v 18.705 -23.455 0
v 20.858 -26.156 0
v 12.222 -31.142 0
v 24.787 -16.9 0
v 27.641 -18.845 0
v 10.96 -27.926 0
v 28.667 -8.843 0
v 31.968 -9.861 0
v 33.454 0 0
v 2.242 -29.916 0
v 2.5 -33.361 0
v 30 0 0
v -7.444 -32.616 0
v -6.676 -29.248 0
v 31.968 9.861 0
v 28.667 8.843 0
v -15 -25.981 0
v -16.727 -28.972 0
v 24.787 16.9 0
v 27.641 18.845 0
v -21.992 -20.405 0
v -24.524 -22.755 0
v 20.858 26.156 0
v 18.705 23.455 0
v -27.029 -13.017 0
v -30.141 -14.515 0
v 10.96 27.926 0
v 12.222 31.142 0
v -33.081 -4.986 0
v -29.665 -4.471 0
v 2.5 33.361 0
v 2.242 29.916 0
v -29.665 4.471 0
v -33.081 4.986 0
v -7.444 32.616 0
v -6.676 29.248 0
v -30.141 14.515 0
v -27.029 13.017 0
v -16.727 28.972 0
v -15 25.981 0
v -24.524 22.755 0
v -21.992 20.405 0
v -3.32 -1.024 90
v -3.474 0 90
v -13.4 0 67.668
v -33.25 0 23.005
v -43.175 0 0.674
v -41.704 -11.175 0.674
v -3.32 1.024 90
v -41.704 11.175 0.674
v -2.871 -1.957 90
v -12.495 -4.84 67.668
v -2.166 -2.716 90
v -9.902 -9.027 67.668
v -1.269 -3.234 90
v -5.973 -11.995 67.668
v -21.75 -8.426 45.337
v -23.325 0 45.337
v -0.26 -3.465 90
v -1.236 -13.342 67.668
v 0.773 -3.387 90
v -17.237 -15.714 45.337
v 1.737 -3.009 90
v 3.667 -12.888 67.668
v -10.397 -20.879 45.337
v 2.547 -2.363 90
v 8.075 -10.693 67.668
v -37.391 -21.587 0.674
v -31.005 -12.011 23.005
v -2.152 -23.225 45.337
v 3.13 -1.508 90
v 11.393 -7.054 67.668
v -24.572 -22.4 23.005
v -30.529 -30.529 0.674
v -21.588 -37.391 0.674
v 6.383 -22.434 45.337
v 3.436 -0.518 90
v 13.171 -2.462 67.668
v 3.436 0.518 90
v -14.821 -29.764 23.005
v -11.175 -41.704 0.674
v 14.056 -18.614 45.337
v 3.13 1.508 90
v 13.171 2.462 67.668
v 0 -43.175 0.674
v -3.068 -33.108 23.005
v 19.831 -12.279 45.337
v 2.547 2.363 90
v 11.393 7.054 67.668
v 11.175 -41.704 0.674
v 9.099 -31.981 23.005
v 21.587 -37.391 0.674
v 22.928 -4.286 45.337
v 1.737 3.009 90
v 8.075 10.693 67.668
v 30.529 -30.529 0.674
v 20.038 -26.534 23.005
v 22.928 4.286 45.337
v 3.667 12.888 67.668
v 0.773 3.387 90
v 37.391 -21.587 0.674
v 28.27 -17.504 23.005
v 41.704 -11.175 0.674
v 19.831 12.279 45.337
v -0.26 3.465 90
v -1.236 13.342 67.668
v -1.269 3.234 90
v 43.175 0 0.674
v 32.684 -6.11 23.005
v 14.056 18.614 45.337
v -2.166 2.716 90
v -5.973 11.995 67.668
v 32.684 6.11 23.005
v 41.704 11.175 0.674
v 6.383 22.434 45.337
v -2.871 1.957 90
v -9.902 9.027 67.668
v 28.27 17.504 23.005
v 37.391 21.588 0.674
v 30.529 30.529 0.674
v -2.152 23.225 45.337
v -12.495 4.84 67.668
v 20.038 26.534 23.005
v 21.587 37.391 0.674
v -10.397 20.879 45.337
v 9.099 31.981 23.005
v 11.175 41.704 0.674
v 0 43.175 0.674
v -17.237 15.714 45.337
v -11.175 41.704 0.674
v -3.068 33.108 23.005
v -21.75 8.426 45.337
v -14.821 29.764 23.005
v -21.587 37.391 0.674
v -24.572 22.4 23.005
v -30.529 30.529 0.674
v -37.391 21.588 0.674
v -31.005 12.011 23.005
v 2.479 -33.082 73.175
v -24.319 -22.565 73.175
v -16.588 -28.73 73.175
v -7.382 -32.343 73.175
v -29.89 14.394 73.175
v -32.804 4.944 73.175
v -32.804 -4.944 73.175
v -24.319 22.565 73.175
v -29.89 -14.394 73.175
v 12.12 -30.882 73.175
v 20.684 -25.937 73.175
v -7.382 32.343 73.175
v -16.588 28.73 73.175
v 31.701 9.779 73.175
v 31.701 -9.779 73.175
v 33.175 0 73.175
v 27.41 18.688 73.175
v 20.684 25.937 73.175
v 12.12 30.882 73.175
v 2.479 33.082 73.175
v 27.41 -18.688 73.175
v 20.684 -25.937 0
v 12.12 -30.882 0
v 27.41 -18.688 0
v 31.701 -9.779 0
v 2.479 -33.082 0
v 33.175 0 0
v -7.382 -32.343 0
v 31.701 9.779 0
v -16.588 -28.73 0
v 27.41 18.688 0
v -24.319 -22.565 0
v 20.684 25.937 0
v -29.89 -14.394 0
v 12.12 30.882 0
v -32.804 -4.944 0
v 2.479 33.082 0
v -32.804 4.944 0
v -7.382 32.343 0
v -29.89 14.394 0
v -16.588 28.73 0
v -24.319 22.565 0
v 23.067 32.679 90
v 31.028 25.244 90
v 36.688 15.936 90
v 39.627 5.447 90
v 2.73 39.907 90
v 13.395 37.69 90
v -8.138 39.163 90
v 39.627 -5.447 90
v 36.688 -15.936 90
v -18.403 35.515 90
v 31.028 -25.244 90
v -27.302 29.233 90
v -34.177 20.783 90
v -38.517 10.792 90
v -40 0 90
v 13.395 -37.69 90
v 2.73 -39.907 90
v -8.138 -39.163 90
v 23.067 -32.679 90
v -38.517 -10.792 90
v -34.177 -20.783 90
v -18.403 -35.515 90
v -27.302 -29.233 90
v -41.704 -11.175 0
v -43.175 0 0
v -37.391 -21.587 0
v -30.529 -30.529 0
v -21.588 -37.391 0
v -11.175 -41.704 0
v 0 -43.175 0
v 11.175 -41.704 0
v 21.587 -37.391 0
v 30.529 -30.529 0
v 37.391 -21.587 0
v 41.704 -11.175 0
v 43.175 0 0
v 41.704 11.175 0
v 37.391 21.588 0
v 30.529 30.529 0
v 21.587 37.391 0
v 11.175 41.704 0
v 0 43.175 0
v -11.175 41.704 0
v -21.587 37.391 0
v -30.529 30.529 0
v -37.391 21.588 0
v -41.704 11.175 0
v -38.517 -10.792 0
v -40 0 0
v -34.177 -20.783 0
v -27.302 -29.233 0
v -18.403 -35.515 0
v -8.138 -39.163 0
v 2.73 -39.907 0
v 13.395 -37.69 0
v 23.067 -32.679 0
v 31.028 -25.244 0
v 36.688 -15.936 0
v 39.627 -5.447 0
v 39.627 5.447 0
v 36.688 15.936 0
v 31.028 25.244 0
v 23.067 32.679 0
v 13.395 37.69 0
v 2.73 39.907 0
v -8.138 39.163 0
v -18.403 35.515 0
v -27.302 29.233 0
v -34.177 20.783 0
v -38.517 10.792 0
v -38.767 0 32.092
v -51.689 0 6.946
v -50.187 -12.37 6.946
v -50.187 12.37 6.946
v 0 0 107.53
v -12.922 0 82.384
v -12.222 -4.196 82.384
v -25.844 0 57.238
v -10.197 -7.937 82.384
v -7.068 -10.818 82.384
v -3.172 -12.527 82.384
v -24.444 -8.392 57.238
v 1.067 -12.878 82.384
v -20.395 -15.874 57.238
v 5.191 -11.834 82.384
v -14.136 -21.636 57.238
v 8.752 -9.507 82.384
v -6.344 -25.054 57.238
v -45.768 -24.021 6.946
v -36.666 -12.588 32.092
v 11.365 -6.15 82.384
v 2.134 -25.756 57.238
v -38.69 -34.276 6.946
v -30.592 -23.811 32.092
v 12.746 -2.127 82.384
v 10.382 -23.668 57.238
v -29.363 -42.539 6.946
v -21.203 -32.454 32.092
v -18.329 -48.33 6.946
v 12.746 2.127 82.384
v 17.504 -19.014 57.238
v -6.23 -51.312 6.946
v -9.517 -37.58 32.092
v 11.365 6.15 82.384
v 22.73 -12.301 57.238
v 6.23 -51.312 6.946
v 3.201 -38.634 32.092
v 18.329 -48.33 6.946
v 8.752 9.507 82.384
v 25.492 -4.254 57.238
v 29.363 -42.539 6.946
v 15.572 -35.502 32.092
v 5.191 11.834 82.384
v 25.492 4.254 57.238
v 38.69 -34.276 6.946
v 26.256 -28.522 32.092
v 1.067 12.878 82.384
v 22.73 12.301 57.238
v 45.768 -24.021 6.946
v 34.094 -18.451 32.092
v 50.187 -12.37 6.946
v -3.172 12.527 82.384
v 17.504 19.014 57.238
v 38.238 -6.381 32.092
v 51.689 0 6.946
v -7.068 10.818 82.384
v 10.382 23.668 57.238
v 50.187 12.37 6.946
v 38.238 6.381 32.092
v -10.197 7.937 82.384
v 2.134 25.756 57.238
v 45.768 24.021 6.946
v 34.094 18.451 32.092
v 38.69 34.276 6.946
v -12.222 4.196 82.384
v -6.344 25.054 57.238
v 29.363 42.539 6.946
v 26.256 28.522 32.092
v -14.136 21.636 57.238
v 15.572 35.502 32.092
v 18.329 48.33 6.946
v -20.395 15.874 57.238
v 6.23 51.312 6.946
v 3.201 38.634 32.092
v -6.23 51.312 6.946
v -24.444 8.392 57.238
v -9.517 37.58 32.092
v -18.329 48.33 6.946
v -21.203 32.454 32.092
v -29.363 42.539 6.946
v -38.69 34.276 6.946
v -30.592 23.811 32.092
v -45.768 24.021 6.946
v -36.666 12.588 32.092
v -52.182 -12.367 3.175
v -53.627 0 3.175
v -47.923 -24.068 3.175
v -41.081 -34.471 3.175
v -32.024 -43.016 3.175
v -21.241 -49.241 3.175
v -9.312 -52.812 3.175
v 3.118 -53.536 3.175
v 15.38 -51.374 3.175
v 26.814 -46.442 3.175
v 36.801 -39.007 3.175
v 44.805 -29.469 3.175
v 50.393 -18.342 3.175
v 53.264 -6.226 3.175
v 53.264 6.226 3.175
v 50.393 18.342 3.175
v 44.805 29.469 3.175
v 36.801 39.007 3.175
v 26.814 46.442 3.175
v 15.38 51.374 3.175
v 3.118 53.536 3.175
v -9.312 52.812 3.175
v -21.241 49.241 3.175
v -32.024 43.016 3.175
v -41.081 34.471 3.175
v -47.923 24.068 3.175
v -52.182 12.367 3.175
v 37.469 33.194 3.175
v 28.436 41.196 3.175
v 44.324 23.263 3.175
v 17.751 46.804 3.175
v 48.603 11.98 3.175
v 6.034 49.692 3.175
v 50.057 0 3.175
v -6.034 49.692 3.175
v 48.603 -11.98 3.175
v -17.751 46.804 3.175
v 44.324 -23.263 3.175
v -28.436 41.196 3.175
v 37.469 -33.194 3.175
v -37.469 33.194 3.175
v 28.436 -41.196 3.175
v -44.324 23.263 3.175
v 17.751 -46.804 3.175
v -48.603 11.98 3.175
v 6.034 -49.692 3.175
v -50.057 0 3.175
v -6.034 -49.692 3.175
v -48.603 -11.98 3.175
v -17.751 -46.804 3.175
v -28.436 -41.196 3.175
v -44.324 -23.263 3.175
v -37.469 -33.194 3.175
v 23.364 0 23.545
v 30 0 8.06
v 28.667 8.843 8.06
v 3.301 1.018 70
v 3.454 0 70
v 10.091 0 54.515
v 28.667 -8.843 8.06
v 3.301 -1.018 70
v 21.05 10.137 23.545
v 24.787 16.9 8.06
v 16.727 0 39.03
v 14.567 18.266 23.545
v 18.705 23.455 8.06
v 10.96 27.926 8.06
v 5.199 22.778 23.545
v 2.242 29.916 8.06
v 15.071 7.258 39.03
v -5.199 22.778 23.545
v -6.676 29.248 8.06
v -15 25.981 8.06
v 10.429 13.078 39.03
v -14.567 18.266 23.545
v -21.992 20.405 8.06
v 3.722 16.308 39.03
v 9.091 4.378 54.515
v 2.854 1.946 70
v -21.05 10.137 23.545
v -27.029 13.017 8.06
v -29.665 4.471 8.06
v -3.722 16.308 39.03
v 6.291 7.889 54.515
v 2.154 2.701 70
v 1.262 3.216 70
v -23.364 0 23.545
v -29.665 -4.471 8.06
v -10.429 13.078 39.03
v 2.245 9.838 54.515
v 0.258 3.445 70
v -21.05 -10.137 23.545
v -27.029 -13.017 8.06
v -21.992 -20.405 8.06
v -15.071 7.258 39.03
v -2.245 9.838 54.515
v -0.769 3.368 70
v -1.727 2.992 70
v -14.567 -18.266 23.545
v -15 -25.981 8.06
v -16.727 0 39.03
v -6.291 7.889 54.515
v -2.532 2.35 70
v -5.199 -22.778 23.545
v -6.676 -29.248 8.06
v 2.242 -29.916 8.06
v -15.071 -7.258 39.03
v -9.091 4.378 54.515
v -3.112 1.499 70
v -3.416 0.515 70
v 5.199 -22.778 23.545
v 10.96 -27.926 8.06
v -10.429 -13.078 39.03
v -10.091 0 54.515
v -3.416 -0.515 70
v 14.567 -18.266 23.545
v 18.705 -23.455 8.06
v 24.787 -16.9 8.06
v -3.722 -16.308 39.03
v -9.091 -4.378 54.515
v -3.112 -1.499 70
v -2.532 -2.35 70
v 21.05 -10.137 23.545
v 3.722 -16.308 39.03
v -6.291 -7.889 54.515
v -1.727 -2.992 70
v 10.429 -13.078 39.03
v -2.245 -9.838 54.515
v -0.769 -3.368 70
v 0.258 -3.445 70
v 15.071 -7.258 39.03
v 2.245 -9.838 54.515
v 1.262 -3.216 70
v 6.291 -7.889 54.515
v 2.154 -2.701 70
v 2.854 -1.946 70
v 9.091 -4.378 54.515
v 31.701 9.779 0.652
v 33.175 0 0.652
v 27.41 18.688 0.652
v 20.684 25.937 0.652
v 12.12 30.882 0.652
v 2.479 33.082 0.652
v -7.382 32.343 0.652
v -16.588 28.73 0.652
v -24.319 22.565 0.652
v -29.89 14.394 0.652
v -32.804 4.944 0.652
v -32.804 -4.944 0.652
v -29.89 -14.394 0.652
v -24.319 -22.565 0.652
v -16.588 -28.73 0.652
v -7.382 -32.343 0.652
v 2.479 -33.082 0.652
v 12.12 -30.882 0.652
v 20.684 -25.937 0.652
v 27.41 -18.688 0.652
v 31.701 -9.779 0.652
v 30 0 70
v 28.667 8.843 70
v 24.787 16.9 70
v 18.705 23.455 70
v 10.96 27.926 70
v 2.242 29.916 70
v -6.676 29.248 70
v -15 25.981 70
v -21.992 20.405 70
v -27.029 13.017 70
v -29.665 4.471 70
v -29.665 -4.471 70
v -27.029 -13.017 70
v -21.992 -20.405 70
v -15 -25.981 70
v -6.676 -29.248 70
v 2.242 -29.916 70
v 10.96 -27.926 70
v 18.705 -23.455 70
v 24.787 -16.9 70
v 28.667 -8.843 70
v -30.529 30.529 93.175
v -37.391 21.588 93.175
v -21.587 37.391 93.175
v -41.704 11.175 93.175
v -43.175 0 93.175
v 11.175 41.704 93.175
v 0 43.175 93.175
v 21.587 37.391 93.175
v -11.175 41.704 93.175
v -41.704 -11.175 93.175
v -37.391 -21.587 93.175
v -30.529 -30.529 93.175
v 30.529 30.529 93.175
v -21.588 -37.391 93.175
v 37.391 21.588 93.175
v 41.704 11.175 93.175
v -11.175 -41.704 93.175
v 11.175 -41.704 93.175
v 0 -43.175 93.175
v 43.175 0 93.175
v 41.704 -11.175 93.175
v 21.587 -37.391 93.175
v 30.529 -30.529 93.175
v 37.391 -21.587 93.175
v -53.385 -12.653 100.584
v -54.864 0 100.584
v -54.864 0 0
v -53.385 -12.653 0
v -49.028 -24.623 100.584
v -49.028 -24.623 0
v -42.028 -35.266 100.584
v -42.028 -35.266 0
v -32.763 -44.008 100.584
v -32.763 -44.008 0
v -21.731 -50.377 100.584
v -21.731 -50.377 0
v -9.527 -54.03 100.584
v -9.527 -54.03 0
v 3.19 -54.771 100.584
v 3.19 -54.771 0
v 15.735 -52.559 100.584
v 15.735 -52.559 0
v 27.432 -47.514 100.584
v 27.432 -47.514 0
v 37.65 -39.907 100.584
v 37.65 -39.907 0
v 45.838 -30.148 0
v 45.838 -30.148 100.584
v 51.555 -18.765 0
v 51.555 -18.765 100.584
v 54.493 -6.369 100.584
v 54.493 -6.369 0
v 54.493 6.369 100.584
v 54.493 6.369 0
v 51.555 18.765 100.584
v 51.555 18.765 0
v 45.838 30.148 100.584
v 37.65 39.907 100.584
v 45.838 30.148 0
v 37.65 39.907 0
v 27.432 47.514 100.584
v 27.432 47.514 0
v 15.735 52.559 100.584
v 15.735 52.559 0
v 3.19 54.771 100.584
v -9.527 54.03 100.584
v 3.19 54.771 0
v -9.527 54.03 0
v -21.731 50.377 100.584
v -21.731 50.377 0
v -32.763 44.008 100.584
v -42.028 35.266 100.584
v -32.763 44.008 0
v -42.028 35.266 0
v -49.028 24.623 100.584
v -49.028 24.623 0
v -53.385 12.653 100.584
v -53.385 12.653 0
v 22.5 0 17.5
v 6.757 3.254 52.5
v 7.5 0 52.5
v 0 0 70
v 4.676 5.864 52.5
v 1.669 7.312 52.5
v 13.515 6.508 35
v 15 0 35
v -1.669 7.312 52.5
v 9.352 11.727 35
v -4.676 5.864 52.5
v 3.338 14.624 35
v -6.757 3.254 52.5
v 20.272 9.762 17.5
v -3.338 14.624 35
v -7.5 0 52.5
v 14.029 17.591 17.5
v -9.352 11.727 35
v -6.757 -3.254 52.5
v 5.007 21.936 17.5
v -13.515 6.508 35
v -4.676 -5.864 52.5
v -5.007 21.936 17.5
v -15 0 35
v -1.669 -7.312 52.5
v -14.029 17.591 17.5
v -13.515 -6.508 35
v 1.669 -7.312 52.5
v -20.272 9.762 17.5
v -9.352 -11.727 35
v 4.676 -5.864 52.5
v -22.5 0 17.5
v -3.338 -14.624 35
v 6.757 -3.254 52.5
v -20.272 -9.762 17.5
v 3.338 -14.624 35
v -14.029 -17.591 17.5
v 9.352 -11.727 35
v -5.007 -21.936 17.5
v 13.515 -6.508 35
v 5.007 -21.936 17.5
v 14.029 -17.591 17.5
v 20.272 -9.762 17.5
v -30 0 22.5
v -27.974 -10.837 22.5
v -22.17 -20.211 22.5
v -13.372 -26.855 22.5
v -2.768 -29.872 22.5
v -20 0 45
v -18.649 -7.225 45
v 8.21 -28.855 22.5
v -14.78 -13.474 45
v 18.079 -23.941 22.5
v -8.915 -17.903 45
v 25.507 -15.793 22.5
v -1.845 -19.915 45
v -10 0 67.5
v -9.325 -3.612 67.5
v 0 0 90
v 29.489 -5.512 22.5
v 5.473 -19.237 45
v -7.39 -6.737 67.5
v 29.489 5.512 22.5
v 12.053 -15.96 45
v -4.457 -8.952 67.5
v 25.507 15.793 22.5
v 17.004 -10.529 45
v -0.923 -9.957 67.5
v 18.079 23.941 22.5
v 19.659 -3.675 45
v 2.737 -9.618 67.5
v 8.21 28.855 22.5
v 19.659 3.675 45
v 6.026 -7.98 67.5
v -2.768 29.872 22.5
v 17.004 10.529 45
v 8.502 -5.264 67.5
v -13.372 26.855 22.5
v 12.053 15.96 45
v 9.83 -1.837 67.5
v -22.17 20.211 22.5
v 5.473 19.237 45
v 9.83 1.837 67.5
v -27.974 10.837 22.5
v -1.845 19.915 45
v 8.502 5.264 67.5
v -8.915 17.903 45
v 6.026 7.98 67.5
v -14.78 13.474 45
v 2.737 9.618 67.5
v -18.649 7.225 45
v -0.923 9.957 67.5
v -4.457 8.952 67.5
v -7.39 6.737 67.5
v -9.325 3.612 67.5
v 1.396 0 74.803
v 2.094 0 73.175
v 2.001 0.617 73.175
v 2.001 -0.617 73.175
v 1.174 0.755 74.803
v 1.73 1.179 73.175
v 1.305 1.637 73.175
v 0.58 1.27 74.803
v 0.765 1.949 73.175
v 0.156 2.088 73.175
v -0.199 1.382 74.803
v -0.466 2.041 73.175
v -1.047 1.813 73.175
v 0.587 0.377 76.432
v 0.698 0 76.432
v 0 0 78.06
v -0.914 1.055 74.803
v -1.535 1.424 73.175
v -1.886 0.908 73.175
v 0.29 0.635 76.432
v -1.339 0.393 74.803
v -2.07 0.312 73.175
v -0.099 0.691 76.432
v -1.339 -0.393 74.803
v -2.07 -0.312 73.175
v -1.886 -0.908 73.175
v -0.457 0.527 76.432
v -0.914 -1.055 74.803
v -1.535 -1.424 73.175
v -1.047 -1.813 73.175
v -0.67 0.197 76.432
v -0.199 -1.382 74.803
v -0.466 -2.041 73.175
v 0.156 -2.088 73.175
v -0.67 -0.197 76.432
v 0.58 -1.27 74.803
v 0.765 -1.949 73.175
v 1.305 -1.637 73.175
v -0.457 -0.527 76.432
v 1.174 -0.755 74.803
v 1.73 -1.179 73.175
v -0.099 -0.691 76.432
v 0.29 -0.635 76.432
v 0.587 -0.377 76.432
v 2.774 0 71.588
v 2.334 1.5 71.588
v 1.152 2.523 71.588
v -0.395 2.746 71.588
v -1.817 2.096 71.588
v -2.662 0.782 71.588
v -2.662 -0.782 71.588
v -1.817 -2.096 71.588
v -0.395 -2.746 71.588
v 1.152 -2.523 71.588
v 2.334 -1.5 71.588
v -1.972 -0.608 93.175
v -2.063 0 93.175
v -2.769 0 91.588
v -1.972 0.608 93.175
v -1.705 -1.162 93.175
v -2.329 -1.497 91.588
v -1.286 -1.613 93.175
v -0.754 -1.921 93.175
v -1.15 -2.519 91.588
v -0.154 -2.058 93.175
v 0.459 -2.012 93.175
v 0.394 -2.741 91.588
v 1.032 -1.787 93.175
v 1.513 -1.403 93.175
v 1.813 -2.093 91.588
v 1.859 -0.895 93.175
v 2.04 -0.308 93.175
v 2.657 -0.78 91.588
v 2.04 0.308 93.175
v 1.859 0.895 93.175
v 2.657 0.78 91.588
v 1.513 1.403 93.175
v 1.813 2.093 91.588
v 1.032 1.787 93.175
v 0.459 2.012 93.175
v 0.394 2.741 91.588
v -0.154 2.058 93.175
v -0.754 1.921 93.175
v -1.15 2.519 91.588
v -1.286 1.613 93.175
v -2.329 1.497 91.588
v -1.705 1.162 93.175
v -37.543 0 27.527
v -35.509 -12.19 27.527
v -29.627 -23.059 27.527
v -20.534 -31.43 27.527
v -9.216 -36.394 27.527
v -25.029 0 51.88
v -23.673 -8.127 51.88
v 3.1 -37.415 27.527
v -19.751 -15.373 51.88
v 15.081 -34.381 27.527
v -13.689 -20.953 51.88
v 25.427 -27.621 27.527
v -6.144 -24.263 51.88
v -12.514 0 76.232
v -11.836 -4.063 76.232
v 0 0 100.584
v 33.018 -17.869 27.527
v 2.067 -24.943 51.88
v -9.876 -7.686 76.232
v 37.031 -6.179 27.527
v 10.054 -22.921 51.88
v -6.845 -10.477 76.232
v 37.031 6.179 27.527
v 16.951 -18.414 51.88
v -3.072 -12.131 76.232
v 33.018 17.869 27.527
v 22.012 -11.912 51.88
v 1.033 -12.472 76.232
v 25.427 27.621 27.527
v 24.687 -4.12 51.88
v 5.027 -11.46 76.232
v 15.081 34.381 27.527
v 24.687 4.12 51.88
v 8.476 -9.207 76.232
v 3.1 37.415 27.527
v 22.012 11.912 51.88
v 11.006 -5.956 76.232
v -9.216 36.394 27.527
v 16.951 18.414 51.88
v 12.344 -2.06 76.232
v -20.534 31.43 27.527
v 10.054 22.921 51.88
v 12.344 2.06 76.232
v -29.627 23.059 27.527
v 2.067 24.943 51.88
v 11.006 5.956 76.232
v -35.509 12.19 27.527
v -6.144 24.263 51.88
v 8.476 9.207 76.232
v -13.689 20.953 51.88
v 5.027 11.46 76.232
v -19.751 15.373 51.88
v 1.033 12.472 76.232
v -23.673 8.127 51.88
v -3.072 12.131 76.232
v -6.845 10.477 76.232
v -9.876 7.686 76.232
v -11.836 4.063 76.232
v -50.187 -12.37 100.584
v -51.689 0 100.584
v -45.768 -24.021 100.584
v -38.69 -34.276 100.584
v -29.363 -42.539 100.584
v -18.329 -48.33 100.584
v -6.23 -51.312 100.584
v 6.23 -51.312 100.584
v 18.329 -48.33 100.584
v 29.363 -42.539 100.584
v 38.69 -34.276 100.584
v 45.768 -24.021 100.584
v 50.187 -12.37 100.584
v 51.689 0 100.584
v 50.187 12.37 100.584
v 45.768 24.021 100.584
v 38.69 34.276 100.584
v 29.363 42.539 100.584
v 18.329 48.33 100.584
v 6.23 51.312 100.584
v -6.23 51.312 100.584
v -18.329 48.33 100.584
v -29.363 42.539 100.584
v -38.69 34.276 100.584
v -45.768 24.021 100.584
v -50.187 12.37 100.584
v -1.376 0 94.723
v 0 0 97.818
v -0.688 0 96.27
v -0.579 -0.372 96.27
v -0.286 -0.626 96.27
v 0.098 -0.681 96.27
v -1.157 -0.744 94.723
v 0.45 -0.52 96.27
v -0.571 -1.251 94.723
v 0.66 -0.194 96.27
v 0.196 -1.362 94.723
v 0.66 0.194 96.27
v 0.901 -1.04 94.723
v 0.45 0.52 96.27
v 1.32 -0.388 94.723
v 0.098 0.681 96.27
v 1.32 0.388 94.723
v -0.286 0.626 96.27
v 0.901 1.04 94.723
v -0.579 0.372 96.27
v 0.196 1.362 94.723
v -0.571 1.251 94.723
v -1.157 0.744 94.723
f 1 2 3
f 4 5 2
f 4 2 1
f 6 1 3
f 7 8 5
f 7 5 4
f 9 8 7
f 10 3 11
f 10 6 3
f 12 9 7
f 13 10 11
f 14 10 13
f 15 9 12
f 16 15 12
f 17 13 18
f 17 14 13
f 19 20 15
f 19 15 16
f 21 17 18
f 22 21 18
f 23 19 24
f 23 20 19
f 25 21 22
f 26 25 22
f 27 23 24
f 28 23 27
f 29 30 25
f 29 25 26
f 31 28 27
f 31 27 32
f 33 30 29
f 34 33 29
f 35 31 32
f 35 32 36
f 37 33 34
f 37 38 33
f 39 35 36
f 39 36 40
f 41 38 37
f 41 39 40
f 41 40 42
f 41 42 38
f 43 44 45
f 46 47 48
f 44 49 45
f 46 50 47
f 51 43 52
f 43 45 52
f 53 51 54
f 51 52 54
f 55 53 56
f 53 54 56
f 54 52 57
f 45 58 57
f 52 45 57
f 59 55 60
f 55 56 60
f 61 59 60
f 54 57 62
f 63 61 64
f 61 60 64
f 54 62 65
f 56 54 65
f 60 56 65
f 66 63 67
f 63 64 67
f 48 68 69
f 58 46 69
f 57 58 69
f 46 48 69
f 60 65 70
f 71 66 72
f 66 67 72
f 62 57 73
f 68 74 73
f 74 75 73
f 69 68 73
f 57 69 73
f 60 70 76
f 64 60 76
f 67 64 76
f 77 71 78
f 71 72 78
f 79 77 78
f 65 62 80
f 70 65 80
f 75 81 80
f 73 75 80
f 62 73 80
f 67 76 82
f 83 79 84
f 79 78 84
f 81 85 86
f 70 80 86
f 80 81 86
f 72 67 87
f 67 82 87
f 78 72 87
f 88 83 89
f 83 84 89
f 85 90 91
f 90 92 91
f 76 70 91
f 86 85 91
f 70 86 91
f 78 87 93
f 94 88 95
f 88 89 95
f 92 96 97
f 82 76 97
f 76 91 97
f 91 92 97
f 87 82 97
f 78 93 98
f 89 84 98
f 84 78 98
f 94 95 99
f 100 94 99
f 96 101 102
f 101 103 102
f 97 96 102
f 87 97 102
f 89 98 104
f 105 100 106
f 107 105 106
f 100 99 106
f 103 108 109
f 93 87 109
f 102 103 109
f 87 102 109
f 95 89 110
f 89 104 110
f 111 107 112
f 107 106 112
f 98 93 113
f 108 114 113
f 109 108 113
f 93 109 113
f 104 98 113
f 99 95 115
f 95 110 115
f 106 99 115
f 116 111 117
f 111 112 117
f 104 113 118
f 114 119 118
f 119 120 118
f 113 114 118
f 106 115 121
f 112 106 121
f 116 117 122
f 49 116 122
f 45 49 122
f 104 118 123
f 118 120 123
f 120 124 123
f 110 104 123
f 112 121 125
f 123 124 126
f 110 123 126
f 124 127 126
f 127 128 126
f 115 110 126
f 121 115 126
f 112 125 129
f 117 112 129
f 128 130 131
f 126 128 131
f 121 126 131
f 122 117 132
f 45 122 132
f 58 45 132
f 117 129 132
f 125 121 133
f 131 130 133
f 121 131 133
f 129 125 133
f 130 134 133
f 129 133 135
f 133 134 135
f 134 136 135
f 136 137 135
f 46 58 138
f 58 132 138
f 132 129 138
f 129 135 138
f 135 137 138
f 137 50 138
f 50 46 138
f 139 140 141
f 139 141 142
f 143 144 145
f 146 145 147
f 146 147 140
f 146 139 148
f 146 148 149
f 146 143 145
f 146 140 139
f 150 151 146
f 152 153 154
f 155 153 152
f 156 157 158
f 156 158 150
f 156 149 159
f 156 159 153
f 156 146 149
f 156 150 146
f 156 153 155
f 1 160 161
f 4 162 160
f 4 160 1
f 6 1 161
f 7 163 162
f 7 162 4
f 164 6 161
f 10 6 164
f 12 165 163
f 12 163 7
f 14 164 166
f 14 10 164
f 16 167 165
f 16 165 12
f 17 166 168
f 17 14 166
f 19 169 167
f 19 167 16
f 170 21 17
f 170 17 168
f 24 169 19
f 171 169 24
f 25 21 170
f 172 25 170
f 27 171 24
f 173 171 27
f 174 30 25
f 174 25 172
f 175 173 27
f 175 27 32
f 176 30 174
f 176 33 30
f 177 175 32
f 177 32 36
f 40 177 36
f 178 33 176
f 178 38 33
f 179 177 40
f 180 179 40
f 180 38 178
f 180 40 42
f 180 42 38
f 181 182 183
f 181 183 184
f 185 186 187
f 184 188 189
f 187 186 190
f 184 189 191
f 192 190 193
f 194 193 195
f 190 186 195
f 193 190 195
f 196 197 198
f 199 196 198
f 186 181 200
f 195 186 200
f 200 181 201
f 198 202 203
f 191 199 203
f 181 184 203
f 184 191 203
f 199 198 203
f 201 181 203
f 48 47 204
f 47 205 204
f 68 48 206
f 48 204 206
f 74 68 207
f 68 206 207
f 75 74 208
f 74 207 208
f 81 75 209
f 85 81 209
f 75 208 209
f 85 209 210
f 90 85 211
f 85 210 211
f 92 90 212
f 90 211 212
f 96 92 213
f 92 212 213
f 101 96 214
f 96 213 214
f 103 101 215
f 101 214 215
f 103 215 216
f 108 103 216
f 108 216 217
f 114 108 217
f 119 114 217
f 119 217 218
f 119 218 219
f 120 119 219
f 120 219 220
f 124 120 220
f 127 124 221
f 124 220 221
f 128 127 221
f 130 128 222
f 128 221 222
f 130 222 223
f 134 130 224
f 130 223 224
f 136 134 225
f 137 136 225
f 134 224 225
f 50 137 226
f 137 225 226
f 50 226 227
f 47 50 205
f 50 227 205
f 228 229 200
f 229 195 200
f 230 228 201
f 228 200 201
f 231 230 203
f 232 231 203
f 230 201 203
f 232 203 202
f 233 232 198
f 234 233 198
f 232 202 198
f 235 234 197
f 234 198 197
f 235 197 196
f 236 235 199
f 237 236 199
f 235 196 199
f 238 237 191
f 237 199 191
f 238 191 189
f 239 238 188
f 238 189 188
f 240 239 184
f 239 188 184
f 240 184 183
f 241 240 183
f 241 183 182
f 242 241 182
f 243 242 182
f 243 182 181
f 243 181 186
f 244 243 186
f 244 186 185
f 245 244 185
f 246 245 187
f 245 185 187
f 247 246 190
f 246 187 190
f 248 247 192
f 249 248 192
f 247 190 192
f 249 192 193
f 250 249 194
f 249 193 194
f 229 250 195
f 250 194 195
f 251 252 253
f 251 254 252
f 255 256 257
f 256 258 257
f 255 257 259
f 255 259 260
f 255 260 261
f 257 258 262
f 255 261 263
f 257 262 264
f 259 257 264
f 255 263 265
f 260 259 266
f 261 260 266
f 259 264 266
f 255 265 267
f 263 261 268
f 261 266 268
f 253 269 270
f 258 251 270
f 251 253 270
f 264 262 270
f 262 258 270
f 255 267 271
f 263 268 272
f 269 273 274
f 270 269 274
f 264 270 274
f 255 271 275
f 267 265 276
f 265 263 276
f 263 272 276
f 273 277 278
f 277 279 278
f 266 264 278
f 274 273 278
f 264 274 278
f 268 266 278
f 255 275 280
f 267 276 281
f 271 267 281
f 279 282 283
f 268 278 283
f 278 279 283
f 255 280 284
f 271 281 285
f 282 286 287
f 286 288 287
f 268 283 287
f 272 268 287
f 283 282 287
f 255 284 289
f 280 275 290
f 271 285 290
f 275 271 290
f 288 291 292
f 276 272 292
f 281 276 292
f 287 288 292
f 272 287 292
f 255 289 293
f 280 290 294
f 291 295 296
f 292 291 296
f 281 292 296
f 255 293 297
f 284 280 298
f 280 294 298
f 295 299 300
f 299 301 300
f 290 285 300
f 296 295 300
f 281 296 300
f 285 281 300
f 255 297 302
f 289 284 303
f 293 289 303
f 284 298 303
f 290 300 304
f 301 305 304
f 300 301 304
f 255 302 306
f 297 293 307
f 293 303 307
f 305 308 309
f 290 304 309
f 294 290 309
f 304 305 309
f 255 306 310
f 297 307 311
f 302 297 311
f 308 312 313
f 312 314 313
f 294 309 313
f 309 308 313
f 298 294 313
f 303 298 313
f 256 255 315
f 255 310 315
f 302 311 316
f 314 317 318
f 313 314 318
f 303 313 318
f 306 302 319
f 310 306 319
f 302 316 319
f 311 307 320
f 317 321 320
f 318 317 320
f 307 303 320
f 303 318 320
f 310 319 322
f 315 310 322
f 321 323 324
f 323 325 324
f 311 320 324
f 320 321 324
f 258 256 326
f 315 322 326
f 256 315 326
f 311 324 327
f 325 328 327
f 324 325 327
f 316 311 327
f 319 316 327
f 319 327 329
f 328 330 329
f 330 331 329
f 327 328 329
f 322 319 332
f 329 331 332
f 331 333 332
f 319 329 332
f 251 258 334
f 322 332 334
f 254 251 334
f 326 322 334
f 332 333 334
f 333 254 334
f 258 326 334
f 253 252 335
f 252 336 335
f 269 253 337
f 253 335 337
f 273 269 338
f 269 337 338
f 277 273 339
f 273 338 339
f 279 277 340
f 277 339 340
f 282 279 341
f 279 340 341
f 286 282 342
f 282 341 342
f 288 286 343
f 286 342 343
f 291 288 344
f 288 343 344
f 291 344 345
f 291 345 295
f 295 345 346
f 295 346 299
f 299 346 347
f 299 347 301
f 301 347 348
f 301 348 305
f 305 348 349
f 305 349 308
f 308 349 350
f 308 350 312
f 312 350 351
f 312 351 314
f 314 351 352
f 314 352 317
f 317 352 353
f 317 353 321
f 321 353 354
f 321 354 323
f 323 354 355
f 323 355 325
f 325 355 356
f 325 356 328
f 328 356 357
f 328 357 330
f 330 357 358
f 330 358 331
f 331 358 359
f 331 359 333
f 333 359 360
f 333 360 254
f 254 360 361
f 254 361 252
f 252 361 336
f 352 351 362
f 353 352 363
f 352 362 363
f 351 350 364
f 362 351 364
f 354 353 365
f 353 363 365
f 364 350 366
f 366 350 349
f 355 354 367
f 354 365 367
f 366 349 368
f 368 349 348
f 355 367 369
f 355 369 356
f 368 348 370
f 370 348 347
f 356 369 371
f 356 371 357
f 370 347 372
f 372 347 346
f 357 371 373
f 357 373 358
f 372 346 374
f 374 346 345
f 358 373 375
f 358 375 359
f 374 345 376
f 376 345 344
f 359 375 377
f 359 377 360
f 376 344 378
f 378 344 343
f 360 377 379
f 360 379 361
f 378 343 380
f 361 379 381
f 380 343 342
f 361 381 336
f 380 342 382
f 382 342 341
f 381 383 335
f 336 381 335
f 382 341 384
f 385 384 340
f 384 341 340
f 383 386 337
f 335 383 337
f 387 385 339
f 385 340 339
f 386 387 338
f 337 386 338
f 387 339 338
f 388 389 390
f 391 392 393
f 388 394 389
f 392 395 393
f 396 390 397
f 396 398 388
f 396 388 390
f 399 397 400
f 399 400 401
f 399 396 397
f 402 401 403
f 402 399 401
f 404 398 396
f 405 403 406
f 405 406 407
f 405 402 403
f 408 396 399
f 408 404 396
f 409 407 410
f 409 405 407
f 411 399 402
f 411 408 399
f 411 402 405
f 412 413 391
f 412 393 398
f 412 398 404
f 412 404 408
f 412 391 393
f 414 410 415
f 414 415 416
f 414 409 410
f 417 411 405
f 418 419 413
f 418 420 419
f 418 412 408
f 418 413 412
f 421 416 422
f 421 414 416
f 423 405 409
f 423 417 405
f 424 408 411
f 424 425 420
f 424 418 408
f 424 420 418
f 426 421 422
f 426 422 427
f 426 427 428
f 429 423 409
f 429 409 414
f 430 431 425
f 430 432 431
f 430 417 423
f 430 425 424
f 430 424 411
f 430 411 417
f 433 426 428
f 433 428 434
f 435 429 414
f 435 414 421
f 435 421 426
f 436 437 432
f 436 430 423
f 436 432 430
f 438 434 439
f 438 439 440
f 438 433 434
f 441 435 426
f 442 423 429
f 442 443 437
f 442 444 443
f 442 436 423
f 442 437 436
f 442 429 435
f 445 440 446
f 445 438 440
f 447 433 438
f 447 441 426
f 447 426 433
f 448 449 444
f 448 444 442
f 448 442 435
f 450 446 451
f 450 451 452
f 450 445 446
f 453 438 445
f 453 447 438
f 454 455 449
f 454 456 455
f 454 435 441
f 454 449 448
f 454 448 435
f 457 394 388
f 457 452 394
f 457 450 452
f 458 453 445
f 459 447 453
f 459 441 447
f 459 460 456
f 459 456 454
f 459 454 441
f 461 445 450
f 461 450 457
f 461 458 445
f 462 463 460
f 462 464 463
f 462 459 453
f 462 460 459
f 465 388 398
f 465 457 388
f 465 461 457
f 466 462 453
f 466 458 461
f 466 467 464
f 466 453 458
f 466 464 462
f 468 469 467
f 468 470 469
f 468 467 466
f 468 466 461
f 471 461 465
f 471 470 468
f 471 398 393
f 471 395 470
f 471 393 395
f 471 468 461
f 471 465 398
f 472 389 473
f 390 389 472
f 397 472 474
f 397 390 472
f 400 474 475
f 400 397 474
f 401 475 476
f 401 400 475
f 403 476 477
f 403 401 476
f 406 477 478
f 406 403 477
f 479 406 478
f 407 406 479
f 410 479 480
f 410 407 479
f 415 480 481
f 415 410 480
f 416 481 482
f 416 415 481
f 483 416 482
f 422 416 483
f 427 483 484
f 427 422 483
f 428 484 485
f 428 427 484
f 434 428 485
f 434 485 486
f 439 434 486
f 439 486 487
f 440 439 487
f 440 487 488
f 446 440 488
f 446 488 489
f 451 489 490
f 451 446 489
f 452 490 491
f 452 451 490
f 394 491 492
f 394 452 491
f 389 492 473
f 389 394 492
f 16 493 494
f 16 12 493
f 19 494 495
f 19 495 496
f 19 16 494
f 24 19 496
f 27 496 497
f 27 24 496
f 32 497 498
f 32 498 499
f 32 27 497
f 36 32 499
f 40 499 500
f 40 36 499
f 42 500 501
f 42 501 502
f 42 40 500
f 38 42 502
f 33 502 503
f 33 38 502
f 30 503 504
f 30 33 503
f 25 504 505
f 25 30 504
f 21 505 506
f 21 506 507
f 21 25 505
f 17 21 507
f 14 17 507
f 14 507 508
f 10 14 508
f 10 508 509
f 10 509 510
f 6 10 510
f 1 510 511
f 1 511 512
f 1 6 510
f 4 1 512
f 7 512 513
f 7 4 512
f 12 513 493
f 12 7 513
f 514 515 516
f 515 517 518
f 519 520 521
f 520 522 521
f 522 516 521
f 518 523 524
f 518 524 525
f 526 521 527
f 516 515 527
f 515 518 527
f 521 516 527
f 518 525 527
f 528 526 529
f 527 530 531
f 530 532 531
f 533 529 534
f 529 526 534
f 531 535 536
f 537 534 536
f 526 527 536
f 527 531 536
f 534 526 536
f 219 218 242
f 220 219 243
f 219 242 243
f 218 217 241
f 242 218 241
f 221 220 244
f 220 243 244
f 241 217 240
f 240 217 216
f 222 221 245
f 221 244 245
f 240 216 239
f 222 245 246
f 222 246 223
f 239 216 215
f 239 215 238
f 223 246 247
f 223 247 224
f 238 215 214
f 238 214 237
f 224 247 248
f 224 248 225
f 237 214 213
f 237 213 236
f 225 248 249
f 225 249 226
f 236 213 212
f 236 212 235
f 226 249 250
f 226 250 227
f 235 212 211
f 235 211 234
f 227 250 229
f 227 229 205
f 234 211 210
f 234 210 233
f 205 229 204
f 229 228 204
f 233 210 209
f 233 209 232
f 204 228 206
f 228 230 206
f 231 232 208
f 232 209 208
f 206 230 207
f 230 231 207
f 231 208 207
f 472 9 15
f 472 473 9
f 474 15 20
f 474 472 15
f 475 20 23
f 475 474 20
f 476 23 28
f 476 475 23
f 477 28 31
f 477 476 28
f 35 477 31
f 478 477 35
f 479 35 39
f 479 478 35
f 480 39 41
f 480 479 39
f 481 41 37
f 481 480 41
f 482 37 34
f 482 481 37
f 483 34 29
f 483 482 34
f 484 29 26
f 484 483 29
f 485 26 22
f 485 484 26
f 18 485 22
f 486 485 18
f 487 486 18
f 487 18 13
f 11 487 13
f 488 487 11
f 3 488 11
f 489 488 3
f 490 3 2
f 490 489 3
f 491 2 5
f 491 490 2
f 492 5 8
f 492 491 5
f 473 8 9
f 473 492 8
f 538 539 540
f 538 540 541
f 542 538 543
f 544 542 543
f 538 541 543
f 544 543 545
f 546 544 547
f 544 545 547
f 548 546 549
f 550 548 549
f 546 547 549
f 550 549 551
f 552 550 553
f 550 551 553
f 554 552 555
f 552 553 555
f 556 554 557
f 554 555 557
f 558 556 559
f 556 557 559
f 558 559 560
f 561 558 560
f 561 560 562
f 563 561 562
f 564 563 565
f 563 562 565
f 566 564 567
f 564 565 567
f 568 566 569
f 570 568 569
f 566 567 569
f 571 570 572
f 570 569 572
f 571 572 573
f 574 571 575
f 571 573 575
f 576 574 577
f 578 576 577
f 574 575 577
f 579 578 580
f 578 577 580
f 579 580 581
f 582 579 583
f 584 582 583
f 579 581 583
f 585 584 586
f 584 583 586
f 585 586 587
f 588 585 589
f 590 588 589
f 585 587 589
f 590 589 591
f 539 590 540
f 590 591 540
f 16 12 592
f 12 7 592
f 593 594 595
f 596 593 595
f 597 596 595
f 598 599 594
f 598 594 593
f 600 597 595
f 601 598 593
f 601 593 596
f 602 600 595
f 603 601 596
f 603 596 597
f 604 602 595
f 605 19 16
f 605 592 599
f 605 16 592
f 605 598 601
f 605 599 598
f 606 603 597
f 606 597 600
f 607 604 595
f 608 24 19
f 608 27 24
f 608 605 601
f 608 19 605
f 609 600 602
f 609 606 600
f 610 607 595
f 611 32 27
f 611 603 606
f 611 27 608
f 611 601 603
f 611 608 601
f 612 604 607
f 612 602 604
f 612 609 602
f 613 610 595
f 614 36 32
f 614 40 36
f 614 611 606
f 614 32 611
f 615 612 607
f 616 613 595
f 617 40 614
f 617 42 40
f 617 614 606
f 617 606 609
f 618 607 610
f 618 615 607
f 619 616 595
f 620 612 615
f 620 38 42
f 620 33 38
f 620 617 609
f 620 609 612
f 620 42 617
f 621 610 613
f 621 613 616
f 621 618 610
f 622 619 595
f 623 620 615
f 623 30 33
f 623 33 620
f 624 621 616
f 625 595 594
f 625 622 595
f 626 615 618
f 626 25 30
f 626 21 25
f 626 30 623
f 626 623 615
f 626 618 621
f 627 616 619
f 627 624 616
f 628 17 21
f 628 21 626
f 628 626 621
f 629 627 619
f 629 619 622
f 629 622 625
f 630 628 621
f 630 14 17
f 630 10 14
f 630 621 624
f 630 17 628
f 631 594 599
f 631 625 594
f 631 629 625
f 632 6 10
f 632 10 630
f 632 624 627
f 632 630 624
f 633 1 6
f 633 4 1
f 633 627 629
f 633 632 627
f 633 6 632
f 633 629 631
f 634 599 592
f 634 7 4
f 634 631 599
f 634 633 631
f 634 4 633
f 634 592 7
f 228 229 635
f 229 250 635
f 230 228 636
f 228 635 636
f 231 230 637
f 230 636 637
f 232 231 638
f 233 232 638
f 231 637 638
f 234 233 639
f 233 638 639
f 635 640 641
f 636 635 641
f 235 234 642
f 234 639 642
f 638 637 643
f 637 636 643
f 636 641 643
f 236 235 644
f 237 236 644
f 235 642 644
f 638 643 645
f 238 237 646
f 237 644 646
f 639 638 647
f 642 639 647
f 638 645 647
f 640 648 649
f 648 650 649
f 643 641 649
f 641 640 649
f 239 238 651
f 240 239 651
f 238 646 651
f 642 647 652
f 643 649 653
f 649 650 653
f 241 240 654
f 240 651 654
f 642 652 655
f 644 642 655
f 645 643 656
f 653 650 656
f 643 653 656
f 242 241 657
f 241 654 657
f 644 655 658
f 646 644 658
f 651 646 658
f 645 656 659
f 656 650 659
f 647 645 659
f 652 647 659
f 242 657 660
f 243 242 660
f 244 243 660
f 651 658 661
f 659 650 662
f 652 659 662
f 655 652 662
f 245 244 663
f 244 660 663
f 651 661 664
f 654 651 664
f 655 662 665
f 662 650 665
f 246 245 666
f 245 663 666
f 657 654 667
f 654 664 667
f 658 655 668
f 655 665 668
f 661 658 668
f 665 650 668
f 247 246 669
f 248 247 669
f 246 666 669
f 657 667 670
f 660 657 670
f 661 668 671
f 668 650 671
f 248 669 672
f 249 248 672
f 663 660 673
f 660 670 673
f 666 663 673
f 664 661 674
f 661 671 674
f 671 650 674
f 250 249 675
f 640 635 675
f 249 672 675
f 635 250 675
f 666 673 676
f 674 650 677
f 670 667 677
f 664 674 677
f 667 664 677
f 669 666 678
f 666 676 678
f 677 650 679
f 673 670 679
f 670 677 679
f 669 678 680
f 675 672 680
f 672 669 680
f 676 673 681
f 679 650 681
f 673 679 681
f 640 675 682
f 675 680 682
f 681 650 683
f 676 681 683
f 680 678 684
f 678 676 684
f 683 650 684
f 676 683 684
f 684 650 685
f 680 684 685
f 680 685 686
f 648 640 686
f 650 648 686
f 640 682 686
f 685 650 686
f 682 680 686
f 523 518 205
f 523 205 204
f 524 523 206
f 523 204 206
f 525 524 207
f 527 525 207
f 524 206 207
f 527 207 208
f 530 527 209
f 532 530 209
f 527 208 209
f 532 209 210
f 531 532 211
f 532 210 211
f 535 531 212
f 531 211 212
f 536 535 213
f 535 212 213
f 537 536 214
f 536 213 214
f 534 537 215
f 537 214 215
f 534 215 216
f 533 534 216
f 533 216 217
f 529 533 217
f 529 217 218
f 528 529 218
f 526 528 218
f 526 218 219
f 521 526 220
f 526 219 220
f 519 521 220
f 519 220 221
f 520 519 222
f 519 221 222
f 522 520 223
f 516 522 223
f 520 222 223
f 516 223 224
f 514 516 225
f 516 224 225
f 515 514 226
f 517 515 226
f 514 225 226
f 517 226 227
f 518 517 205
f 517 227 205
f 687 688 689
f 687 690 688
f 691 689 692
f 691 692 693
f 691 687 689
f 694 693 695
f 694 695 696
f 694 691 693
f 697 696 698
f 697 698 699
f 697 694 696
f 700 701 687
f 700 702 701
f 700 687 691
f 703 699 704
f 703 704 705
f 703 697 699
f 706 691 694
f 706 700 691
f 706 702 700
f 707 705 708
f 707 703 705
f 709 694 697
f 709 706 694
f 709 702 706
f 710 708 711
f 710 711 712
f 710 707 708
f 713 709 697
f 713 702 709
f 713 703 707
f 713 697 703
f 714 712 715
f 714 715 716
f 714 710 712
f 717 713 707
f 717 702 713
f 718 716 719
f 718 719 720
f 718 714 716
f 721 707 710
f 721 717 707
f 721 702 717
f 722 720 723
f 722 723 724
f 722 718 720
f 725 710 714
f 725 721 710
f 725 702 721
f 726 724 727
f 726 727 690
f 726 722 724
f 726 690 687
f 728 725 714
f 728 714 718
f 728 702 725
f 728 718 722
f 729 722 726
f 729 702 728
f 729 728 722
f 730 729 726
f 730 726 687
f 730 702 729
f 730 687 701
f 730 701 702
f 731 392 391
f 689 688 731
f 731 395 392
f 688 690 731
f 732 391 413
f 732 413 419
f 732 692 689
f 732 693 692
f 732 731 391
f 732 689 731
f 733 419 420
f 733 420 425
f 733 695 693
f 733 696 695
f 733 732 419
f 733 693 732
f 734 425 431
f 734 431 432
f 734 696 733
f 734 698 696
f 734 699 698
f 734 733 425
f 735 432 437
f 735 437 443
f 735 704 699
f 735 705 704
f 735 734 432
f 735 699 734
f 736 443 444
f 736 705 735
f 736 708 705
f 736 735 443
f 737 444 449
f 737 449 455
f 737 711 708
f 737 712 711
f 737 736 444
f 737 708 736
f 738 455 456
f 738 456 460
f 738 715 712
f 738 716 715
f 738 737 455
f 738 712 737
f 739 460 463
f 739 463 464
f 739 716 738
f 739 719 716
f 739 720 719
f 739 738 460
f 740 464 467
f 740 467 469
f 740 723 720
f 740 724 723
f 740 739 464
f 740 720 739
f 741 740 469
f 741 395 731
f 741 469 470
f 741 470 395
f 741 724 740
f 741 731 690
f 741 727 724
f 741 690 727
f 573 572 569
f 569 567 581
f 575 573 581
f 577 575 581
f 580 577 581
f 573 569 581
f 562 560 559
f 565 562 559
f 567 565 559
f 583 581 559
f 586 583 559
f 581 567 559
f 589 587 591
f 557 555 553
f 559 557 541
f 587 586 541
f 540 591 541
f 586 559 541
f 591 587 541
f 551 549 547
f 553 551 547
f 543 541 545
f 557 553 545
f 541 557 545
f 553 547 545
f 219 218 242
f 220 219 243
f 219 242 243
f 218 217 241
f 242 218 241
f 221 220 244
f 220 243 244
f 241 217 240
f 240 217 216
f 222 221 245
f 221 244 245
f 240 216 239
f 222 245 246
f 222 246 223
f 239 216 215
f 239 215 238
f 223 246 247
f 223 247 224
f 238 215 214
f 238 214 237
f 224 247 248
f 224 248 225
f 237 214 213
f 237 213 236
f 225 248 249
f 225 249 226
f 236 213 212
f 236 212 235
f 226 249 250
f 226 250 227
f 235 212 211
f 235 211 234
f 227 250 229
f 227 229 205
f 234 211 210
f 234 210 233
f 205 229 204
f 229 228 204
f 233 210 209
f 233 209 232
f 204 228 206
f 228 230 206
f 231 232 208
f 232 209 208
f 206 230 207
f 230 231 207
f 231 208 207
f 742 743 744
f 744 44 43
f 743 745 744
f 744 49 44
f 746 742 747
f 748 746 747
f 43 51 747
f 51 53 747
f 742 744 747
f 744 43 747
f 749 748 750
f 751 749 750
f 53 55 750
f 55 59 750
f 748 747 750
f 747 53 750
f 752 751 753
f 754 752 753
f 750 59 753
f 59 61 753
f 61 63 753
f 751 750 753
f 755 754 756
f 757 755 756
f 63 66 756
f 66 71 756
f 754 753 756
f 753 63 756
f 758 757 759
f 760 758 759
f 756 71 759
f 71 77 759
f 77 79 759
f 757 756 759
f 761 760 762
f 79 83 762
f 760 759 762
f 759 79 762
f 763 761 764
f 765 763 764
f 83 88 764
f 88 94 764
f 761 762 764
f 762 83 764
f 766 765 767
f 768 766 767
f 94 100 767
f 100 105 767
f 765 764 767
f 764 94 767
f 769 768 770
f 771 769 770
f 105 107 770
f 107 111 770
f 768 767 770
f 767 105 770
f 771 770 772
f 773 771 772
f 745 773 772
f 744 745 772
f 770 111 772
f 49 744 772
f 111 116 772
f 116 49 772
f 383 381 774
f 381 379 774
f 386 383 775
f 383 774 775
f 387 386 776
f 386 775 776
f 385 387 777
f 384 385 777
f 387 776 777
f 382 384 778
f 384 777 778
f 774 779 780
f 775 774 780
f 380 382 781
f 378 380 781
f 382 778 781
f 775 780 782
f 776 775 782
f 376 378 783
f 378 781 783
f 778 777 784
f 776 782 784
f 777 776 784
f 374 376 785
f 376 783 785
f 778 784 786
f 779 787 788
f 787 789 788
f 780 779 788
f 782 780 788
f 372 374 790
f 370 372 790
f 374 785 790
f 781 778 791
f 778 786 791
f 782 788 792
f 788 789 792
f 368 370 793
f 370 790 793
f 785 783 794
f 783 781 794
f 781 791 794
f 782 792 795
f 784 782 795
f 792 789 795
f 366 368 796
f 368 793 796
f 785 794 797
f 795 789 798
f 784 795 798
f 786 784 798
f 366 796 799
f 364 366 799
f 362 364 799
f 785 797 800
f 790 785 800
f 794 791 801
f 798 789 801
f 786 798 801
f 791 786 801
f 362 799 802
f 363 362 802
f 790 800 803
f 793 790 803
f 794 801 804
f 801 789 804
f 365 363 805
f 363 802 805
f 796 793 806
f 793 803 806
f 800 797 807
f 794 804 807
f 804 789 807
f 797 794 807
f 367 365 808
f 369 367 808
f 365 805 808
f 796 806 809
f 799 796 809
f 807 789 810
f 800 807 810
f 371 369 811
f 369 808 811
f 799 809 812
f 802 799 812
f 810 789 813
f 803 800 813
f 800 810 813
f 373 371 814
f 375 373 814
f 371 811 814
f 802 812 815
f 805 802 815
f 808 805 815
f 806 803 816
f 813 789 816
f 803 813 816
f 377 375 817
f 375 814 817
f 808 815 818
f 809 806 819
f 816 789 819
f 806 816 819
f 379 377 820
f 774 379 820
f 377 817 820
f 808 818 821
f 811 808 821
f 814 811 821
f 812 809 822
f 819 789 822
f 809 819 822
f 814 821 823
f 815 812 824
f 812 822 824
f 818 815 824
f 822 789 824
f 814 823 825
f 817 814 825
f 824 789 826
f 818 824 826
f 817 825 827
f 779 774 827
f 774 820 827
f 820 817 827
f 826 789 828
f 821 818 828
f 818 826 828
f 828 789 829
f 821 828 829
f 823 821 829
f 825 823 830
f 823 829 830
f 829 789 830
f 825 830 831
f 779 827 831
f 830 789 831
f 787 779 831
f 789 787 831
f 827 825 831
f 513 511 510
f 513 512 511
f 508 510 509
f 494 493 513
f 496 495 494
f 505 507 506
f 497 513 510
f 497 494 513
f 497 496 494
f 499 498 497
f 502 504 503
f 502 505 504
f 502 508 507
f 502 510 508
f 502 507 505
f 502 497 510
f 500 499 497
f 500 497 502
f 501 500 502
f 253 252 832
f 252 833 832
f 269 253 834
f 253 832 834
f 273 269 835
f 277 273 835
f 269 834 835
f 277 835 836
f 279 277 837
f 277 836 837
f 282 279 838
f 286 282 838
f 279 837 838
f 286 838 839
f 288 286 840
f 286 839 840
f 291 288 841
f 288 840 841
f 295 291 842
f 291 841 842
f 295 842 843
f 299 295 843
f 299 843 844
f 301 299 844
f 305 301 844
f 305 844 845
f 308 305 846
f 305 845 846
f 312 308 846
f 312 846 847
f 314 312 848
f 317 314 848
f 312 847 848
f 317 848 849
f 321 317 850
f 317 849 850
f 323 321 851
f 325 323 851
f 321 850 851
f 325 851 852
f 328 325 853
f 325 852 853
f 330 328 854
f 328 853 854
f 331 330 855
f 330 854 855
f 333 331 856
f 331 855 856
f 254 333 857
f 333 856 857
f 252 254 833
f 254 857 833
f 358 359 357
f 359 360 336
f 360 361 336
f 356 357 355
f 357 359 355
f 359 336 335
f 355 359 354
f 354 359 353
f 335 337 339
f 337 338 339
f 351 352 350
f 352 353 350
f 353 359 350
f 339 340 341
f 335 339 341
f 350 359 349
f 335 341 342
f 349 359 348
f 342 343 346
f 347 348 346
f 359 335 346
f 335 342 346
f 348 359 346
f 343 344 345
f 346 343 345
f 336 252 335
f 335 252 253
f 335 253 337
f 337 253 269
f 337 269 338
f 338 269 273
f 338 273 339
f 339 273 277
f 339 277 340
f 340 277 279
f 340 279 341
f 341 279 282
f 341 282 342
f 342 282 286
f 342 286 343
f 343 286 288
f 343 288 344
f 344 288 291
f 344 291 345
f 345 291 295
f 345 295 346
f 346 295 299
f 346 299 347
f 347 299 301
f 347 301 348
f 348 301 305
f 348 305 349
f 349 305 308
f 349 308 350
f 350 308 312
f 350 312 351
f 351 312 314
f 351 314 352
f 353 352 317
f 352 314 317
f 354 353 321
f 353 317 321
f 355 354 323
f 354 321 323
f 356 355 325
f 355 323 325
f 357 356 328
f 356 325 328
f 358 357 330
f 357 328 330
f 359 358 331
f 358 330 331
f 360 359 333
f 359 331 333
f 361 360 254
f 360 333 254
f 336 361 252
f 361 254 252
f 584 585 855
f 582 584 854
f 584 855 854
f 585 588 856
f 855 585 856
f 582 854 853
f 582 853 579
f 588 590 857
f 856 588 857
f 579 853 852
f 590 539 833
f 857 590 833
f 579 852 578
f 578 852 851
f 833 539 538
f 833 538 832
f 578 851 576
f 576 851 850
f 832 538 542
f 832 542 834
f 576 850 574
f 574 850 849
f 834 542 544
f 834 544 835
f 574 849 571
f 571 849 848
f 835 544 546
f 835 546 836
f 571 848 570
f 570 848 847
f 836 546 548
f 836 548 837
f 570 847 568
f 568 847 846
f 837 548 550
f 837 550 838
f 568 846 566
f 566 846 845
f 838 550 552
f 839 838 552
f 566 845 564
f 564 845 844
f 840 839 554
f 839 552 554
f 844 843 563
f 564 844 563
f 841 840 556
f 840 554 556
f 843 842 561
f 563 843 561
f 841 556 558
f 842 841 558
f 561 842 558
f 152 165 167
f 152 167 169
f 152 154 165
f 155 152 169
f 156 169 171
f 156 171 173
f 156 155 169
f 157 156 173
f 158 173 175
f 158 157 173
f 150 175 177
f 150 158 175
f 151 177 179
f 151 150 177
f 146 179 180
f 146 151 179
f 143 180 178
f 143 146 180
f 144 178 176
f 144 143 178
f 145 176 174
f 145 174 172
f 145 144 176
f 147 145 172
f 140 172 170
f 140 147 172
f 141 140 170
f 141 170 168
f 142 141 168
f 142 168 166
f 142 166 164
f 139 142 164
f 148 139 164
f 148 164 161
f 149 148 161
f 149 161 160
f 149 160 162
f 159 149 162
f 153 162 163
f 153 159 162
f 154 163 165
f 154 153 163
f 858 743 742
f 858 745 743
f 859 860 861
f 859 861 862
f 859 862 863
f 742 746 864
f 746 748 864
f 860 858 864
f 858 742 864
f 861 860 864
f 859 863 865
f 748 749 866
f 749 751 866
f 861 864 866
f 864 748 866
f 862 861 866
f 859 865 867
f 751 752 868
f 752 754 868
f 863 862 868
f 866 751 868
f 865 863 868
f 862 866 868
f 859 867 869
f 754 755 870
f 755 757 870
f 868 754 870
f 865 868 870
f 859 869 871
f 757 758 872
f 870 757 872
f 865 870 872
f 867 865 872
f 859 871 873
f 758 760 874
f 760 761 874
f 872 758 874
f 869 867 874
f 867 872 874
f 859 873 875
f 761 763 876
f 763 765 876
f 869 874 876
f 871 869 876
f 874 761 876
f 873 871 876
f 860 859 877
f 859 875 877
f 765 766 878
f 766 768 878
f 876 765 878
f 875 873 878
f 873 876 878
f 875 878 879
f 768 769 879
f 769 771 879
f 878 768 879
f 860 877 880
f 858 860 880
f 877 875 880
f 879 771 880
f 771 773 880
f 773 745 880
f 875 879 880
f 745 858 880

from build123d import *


with BuildPart() as f1:
    # F0 (on Front) → F1 (revolve)
    with BuildSketch(Plane.XZ):
        Polygon((-51.689, 0), (0, 0), (0, 3.175), (-50.0574027778, 3.175), (-51.689, 3.175), (-53.627099473, 3.175), (-51.689, 6.9464368122), (-51.689, 100.584), (-54.864, 100.584), (-54.864, 0), align=None)
    revolve(axis=Axis((0, 0, 27.9178853571), (0, 0, 1)))


with BuildPart() as f2:
    # F0 (on Front) → F2 (revolve)
    with BuildSketch(Plane.XZ):
        Polygon((-51.689, 3.175), (-50.0574027778, 3.175), (0, 100.584), (0, 107.5304368122), (-51.689, 6.9464368122), align=None)
        Polygon((-53.627099473, 3.175), (-51.689, 3.175), (-51.689, 6.9464368122), align=None)
    revolve(axis=Axis((0, 0, 27.9178853571), (0, 0, 1)))


with BuildPart() as f4:
    # F3 (on Front) → F4 (revolve)
    with BuildSketch(Plane.XZ):
        Polygon((-43.175, 0.6737808802), (-40, 7.8175308802), (-40, 90), (-3.474458169, 90), (-2.0633470579, 93.175), (-43.175, 93.175), align=None)
        Polygon((-3.474458169, 90), (0, 90), (0, 93.175), (-2.0633470579, 93.175), align=None)
        Polygon((-43.175, 0), (-40, 0), (-40, 7.8175308802), (-43.175, 0.6737808802), align=None)
    revolve(axis=Axis((0, 0, 45), (0, 0, 1)))


with BuildPart() as f5:
    # F3 (on Front) → F5 (revolve)
    with BuildSketch(Plane.XZ):
        Polygon((-40, 7.8175308802), (-40, 0), (0, 90), (-3.474458169, 90), align=None)
        Polygon((-3.474458169, 90), (0, 90), (0, 93.175), (-2.0633470579, 93.175), align=None)
        Polygon((-2.0633470579, 93.175), (0, 93.175), (0, 97.8175308802), align=None)
        Polygon((-43.175, 0), (-40, 0), (-40, 7.8175308802), (-43.175, 0.6737808802), align=None)
    revolve(axis=Axis((0, 0, 45), (0, 0, 1)))


with BuildPart() as f7:
    # F6 (on Front) → F7 (revolve)
    with BuildSketch(Plane.XZ):
        Polygon((0, 70), (30, 0), (30, 8.060026537), (3.4542970873, 70), align=None)
        Polygon((0, 73.175), (0, 70), (3.4542970873, 70), (2.0935828016, 73.175), align=None)
        Polygon((0, 78.060026537), (0, 73.175), (2.0935828016, 73.175), align=None)
        Polygon((30, 8.060026537), (30, 0), (33.175, 0), (33.175, 0.6516932037), align=None)
        Polygon((33.175, 0.6516932037), (33.175, 0), (33.4542970873, 0), align=None)
    revolve(axis=Axis((0, 0, 35), (0, 0, 1)))


with BuildPart() as f8:
    # F6 (on Front) → F8 (revolve)
    with BuildSketch(Plane.XZ):
        Polygon((30, 70), (30, 8.060026537), (33.175, 0.6516932037), (33.175, 73.175), (2.0935828016, 73.175), (3.4542970873, 70), align=None)
        Polygon((0, 73.175), (0, 70), (3.4542970873, 70), (2.0935828016, 73.175), align=None)
        Polygon((30, 8.060026537), (30, 0), (33.175, 0), (33.175, 0.6516932037), align=None)
    revolve(axis=Axis((0, 0, 35), (0, 0, 1)))


solid = Compound([f1.part, f2.part, f4.part, f5.part, f7.part, f8.part])
